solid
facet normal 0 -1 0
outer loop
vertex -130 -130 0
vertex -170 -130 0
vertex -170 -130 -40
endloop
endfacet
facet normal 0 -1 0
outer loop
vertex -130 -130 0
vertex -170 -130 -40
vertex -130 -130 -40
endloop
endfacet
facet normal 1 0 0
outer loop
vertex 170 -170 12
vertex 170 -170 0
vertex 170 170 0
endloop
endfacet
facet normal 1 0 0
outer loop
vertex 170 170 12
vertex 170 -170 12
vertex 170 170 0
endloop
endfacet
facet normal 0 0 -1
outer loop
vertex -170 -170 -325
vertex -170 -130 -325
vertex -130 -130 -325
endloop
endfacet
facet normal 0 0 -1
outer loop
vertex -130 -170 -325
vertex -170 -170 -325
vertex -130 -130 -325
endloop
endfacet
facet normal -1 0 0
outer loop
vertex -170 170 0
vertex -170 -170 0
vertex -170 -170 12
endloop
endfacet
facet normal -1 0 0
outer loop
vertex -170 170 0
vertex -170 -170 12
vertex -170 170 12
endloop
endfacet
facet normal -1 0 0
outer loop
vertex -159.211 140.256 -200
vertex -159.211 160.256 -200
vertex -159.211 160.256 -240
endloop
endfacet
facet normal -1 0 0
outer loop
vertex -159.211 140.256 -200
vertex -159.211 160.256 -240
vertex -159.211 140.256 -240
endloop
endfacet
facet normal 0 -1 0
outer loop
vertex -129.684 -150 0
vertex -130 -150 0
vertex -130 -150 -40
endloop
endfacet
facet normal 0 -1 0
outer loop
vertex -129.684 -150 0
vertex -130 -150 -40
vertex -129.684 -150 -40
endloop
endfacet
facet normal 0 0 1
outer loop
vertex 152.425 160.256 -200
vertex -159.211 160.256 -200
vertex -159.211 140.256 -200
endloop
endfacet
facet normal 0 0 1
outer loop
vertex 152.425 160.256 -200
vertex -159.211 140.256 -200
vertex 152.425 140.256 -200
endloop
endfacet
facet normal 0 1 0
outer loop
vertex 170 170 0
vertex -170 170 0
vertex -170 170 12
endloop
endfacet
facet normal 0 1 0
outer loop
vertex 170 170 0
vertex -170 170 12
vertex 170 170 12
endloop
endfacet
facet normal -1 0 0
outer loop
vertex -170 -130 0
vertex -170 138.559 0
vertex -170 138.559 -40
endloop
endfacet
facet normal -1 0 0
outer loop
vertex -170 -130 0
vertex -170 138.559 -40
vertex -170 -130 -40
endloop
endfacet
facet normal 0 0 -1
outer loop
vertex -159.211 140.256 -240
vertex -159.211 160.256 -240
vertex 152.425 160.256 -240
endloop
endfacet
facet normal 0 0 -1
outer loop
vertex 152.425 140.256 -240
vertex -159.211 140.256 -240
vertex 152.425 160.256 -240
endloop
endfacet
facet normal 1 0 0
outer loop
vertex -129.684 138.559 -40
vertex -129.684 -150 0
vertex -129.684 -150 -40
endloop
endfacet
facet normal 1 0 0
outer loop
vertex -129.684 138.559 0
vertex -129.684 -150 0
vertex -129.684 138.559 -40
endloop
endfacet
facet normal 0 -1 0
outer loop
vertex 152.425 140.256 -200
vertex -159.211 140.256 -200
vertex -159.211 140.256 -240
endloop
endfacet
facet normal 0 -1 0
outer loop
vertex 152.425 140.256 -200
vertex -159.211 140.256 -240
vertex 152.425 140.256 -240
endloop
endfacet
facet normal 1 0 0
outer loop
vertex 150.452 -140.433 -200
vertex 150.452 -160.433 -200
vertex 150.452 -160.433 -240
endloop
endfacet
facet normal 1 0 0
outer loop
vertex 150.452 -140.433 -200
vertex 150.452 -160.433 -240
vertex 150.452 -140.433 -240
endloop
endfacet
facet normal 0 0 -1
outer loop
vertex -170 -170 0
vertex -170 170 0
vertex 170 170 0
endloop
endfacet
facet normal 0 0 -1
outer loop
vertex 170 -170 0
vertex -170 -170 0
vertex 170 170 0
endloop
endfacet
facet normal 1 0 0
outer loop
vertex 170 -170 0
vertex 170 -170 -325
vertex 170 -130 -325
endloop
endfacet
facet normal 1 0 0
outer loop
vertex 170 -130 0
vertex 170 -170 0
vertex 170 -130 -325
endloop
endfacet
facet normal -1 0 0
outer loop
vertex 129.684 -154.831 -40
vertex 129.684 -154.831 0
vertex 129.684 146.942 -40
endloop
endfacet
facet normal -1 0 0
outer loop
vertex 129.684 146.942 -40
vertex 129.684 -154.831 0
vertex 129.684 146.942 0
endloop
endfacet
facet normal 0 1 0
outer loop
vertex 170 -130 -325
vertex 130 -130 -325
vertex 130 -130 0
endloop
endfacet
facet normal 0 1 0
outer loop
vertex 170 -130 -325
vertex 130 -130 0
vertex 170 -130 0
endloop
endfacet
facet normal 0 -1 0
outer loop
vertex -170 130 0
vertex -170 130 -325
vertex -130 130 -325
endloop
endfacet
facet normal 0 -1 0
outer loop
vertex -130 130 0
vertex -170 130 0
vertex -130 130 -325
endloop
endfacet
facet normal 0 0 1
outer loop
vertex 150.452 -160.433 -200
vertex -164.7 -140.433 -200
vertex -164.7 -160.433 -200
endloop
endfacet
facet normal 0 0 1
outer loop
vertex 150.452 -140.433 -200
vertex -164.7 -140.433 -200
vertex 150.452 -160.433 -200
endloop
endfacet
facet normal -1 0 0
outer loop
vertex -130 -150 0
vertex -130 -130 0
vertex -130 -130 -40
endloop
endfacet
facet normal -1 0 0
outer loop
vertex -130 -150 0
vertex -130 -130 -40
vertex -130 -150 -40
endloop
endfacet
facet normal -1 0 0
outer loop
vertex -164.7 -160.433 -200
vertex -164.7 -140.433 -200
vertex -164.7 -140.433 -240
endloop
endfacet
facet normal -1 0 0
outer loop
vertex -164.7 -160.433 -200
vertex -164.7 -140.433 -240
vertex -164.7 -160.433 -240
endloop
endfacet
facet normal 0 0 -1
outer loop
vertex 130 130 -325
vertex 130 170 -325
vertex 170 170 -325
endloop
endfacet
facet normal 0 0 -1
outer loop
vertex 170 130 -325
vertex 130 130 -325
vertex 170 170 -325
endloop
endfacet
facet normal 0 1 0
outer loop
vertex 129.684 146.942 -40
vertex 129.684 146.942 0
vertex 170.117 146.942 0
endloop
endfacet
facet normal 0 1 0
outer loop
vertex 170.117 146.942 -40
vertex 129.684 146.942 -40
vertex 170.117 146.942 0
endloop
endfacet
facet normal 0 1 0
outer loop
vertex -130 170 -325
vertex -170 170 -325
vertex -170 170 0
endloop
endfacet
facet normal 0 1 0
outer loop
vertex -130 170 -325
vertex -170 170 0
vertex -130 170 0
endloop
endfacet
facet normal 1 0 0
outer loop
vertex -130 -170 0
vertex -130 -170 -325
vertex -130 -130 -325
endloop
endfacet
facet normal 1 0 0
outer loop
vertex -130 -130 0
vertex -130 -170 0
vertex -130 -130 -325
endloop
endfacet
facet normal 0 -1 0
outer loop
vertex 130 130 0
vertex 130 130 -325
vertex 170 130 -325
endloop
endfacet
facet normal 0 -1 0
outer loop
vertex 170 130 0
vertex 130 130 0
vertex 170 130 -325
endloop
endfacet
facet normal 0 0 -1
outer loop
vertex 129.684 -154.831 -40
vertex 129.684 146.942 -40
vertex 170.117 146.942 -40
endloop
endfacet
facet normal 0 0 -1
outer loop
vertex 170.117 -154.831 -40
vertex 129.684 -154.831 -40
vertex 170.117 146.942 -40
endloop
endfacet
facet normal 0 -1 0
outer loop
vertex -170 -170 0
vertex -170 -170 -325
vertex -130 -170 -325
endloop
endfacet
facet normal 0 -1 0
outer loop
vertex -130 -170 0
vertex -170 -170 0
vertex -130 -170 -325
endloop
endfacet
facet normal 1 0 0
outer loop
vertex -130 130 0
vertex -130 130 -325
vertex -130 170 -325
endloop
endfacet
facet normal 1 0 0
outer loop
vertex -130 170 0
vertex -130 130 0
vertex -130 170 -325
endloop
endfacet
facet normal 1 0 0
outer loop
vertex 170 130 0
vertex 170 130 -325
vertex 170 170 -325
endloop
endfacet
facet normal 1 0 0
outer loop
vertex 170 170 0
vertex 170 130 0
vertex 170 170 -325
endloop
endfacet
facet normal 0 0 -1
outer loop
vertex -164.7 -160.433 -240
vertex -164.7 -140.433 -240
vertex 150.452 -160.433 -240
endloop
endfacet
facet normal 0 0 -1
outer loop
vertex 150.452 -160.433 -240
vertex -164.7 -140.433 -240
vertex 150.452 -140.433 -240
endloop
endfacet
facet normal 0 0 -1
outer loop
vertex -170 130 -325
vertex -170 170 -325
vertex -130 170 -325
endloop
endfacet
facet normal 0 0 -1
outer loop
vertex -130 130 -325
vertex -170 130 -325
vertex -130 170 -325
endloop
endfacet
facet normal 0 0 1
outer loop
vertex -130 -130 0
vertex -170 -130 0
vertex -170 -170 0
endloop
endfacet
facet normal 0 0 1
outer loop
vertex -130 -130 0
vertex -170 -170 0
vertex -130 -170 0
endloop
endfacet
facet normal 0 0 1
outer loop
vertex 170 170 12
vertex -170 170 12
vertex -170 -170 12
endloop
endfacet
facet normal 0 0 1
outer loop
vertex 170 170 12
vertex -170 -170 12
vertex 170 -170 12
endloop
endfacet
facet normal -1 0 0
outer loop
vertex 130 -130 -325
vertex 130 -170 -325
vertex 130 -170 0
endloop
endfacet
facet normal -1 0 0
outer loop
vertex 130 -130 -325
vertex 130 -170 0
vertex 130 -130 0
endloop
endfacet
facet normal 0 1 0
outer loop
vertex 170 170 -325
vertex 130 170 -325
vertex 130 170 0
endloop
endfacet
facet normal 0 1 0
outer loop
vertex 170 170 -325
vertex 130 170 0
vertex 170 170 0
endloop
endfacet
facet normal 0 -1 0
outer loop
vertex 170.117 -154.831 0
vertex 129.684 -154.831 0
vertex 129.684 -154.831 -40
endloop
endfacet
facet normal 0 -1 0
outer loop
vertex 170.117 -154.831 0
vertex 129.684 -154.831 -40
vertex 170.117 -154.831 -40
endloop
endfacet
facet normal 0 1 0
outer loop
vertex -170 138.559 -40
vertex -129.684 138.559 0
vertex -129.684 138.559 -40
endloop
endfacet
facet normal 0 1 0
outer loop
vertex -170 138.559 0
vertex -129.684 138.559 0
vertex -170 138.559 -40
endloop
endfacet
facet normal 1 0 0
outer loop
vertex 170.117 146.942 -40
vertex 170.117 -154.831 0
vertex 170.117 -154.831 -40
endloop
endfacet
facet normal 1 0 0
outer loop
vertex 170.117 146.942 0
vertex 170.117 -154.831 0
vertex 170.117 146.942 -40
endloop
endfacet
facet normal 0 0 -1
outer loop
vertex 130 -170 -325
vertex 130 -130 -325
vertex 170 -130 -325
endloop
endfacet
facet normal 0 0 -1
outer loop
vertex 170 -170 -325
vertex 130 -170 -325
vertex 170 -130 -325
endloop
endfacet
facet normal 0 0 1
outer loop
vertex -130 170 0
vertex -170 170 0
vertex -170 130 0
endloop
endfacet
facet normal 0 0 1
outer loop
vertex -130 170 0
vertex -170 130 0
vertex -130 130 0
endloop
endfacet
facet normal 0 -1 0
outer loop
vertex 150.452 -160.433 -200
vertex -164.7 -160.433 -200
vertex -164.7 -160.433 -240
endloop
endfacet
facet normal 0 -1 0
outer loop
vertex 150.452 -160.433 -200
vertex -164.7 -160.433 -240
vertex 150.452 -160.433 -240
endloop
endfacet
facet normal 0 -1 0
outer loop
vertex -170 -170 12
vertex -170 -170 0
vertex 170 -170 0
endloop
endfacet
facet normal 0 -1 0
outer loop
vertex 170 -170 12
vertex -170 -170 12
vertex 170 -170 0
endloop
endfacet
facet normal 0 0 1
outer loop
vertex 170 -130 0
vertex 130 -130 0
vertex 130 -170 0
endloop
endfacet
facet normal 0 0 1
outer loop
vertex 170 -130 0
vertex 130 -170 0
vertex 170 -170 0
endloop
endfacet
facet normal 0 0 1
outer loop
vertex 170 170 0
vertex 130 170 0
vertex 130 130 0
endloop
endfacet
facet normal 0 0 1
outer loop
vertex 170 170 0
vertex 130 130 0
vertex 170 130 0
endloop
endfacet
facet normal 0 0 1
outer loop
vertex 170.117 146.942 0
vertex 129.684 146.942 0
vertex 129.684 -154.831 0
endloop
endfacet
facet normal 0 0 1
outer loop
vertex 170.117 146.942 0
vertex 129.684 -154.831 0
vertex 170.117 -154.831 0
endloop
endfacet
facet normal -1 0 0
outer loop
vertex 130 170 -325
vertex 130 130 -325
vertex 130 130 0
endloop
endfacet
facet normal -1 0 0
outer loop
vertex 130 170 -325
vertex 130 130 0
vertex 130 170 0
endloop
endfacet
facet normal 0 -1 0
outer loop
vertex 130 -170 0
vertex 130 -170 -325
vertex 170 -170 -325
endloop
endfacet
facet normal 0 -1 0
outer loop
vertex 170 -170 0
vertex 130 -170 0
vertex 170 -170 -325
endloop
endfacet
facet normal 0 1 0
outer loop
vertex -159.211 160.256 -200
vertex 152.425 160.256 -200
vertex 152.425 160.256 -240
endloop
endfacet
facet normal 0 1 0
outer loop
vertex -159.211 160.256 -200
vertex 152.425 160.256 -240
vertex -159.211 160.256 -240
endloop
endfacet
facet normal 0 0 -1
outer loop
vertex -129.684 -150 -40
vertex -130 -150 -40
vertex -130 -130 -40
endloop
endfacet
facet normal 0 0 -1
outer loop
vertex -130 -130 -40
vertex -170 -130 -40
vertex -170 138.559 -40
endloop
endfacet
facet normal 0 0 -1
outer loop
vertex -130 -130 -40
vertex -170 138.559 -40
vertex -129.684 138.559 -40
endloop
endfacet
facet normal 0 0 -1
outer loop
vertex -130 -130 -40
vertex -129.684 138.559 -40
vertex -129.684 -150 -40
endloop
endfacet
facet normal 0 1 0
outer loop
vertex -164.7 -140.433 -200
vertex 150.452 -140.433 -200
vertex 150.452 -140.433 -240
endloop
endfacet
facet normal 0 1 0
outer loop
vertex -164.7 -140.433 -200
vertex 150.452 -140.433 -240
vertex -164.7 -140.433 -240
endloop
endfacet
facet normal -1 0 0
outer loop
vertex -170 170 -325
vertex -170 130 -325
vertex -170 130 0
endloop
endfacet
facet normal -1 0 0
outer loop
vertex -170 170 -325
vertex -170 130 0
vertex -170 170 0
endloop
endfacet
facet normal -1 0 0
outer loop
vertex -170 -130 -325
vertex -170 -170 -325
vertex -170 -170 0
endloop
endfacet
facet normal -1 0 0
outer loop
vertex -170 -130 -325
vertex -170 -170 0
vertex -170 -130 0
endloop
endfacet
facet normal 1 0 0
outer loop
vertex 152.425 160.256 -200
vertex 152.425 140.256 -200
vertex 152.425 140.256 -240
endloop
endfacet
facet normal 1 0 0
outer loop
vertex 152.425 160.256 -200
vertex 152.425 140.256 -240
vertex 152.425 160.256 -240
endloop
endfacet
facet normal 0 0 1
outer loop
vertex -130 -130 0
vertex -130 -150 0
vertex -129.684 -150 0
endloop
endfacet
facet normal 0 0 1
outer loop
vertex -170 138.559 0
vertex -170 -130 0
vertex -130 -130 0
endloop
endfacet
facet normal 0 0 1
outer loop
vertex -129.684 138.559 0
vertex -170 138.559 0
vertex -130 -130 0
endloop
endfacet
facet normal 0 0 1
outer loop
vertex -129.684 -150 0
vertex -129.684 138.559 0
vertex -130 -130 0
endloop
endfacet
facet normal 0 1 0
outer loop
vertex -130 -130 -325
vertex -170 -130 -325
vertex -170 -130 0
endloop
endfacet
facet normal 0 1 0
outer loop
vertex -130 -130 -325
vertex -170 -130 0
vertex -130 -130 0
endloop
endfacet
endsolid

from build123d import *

# Parameters (mm, degrees)
F0_W     = 40
F0_H     = 40
F1_DEPTH = 325
F2_W     = 40.433705
F2_H     = 301.773489
F3_DEPTH = 40
F6_DEPTH = 40
F7_W     = 340
F7_H     = 340
F8_DEPTH = 12


with BuildPart() as f1:
    # F0 (on Top) → F1 (new body)
    with BuildSketch(Plane.XY):
        with Locations((-150, -150)):
            Rectangle(F0_W, F0_H)
        with Locations((-150, 150)):
            Rectangle(F0_W, F0_H)
        with Locations((150, -150)):
            Rectangle(F0_W, F0_H)
        with Locations((150, 150)):
            Rectangle(F0_W, F0_H)
    extrude(amount=-F1_DEPTH)


with BuildPart() as f3:
    # F2 (on face) → F3 (new body)
    with BuildSketch(Plane.XY):
        Polygon((-130, -130), (-130, -150), (-129.683703, -150), (-129.683703, 138.559386), (-170, 138.559386), (-170, -130), align=None)
        with Locations((149.900555, -3.944754)):
            Rectangle(F2_W, F2_H)
    extrude(amount=-F3_DEPTH)


with BuildPart() as f6:
    # F5 (on offset) → F6 (new body)
    with BuildSketch(Plane.XY.offset(-200)):
        Polygon((-164.699642, -140.433019), (-164.699642, -160.433019), (-112.794841, -160.433019), (150.452346, -160.433019), (150.452346, -140.433019), align=None)
        Polygon((152.424738, 160.255536), (-152.307317, 160.255536), (-159.210637, 160.255536), (-159.210637, 140.255536), (152.424738, 140.255536), align=None)
    extrude(amount=-F6_DEPTH)


with BuildPart() as f8:
    # F7 (on Top) → F8 (new body)
    with BuildSketch(Plane.XY):
        Rectangle(F7_W, F7_H)
    extrude(amount=F8_DEPTH)


solid = Compound([f1.part, f3.part, f6.part, f8.part])
